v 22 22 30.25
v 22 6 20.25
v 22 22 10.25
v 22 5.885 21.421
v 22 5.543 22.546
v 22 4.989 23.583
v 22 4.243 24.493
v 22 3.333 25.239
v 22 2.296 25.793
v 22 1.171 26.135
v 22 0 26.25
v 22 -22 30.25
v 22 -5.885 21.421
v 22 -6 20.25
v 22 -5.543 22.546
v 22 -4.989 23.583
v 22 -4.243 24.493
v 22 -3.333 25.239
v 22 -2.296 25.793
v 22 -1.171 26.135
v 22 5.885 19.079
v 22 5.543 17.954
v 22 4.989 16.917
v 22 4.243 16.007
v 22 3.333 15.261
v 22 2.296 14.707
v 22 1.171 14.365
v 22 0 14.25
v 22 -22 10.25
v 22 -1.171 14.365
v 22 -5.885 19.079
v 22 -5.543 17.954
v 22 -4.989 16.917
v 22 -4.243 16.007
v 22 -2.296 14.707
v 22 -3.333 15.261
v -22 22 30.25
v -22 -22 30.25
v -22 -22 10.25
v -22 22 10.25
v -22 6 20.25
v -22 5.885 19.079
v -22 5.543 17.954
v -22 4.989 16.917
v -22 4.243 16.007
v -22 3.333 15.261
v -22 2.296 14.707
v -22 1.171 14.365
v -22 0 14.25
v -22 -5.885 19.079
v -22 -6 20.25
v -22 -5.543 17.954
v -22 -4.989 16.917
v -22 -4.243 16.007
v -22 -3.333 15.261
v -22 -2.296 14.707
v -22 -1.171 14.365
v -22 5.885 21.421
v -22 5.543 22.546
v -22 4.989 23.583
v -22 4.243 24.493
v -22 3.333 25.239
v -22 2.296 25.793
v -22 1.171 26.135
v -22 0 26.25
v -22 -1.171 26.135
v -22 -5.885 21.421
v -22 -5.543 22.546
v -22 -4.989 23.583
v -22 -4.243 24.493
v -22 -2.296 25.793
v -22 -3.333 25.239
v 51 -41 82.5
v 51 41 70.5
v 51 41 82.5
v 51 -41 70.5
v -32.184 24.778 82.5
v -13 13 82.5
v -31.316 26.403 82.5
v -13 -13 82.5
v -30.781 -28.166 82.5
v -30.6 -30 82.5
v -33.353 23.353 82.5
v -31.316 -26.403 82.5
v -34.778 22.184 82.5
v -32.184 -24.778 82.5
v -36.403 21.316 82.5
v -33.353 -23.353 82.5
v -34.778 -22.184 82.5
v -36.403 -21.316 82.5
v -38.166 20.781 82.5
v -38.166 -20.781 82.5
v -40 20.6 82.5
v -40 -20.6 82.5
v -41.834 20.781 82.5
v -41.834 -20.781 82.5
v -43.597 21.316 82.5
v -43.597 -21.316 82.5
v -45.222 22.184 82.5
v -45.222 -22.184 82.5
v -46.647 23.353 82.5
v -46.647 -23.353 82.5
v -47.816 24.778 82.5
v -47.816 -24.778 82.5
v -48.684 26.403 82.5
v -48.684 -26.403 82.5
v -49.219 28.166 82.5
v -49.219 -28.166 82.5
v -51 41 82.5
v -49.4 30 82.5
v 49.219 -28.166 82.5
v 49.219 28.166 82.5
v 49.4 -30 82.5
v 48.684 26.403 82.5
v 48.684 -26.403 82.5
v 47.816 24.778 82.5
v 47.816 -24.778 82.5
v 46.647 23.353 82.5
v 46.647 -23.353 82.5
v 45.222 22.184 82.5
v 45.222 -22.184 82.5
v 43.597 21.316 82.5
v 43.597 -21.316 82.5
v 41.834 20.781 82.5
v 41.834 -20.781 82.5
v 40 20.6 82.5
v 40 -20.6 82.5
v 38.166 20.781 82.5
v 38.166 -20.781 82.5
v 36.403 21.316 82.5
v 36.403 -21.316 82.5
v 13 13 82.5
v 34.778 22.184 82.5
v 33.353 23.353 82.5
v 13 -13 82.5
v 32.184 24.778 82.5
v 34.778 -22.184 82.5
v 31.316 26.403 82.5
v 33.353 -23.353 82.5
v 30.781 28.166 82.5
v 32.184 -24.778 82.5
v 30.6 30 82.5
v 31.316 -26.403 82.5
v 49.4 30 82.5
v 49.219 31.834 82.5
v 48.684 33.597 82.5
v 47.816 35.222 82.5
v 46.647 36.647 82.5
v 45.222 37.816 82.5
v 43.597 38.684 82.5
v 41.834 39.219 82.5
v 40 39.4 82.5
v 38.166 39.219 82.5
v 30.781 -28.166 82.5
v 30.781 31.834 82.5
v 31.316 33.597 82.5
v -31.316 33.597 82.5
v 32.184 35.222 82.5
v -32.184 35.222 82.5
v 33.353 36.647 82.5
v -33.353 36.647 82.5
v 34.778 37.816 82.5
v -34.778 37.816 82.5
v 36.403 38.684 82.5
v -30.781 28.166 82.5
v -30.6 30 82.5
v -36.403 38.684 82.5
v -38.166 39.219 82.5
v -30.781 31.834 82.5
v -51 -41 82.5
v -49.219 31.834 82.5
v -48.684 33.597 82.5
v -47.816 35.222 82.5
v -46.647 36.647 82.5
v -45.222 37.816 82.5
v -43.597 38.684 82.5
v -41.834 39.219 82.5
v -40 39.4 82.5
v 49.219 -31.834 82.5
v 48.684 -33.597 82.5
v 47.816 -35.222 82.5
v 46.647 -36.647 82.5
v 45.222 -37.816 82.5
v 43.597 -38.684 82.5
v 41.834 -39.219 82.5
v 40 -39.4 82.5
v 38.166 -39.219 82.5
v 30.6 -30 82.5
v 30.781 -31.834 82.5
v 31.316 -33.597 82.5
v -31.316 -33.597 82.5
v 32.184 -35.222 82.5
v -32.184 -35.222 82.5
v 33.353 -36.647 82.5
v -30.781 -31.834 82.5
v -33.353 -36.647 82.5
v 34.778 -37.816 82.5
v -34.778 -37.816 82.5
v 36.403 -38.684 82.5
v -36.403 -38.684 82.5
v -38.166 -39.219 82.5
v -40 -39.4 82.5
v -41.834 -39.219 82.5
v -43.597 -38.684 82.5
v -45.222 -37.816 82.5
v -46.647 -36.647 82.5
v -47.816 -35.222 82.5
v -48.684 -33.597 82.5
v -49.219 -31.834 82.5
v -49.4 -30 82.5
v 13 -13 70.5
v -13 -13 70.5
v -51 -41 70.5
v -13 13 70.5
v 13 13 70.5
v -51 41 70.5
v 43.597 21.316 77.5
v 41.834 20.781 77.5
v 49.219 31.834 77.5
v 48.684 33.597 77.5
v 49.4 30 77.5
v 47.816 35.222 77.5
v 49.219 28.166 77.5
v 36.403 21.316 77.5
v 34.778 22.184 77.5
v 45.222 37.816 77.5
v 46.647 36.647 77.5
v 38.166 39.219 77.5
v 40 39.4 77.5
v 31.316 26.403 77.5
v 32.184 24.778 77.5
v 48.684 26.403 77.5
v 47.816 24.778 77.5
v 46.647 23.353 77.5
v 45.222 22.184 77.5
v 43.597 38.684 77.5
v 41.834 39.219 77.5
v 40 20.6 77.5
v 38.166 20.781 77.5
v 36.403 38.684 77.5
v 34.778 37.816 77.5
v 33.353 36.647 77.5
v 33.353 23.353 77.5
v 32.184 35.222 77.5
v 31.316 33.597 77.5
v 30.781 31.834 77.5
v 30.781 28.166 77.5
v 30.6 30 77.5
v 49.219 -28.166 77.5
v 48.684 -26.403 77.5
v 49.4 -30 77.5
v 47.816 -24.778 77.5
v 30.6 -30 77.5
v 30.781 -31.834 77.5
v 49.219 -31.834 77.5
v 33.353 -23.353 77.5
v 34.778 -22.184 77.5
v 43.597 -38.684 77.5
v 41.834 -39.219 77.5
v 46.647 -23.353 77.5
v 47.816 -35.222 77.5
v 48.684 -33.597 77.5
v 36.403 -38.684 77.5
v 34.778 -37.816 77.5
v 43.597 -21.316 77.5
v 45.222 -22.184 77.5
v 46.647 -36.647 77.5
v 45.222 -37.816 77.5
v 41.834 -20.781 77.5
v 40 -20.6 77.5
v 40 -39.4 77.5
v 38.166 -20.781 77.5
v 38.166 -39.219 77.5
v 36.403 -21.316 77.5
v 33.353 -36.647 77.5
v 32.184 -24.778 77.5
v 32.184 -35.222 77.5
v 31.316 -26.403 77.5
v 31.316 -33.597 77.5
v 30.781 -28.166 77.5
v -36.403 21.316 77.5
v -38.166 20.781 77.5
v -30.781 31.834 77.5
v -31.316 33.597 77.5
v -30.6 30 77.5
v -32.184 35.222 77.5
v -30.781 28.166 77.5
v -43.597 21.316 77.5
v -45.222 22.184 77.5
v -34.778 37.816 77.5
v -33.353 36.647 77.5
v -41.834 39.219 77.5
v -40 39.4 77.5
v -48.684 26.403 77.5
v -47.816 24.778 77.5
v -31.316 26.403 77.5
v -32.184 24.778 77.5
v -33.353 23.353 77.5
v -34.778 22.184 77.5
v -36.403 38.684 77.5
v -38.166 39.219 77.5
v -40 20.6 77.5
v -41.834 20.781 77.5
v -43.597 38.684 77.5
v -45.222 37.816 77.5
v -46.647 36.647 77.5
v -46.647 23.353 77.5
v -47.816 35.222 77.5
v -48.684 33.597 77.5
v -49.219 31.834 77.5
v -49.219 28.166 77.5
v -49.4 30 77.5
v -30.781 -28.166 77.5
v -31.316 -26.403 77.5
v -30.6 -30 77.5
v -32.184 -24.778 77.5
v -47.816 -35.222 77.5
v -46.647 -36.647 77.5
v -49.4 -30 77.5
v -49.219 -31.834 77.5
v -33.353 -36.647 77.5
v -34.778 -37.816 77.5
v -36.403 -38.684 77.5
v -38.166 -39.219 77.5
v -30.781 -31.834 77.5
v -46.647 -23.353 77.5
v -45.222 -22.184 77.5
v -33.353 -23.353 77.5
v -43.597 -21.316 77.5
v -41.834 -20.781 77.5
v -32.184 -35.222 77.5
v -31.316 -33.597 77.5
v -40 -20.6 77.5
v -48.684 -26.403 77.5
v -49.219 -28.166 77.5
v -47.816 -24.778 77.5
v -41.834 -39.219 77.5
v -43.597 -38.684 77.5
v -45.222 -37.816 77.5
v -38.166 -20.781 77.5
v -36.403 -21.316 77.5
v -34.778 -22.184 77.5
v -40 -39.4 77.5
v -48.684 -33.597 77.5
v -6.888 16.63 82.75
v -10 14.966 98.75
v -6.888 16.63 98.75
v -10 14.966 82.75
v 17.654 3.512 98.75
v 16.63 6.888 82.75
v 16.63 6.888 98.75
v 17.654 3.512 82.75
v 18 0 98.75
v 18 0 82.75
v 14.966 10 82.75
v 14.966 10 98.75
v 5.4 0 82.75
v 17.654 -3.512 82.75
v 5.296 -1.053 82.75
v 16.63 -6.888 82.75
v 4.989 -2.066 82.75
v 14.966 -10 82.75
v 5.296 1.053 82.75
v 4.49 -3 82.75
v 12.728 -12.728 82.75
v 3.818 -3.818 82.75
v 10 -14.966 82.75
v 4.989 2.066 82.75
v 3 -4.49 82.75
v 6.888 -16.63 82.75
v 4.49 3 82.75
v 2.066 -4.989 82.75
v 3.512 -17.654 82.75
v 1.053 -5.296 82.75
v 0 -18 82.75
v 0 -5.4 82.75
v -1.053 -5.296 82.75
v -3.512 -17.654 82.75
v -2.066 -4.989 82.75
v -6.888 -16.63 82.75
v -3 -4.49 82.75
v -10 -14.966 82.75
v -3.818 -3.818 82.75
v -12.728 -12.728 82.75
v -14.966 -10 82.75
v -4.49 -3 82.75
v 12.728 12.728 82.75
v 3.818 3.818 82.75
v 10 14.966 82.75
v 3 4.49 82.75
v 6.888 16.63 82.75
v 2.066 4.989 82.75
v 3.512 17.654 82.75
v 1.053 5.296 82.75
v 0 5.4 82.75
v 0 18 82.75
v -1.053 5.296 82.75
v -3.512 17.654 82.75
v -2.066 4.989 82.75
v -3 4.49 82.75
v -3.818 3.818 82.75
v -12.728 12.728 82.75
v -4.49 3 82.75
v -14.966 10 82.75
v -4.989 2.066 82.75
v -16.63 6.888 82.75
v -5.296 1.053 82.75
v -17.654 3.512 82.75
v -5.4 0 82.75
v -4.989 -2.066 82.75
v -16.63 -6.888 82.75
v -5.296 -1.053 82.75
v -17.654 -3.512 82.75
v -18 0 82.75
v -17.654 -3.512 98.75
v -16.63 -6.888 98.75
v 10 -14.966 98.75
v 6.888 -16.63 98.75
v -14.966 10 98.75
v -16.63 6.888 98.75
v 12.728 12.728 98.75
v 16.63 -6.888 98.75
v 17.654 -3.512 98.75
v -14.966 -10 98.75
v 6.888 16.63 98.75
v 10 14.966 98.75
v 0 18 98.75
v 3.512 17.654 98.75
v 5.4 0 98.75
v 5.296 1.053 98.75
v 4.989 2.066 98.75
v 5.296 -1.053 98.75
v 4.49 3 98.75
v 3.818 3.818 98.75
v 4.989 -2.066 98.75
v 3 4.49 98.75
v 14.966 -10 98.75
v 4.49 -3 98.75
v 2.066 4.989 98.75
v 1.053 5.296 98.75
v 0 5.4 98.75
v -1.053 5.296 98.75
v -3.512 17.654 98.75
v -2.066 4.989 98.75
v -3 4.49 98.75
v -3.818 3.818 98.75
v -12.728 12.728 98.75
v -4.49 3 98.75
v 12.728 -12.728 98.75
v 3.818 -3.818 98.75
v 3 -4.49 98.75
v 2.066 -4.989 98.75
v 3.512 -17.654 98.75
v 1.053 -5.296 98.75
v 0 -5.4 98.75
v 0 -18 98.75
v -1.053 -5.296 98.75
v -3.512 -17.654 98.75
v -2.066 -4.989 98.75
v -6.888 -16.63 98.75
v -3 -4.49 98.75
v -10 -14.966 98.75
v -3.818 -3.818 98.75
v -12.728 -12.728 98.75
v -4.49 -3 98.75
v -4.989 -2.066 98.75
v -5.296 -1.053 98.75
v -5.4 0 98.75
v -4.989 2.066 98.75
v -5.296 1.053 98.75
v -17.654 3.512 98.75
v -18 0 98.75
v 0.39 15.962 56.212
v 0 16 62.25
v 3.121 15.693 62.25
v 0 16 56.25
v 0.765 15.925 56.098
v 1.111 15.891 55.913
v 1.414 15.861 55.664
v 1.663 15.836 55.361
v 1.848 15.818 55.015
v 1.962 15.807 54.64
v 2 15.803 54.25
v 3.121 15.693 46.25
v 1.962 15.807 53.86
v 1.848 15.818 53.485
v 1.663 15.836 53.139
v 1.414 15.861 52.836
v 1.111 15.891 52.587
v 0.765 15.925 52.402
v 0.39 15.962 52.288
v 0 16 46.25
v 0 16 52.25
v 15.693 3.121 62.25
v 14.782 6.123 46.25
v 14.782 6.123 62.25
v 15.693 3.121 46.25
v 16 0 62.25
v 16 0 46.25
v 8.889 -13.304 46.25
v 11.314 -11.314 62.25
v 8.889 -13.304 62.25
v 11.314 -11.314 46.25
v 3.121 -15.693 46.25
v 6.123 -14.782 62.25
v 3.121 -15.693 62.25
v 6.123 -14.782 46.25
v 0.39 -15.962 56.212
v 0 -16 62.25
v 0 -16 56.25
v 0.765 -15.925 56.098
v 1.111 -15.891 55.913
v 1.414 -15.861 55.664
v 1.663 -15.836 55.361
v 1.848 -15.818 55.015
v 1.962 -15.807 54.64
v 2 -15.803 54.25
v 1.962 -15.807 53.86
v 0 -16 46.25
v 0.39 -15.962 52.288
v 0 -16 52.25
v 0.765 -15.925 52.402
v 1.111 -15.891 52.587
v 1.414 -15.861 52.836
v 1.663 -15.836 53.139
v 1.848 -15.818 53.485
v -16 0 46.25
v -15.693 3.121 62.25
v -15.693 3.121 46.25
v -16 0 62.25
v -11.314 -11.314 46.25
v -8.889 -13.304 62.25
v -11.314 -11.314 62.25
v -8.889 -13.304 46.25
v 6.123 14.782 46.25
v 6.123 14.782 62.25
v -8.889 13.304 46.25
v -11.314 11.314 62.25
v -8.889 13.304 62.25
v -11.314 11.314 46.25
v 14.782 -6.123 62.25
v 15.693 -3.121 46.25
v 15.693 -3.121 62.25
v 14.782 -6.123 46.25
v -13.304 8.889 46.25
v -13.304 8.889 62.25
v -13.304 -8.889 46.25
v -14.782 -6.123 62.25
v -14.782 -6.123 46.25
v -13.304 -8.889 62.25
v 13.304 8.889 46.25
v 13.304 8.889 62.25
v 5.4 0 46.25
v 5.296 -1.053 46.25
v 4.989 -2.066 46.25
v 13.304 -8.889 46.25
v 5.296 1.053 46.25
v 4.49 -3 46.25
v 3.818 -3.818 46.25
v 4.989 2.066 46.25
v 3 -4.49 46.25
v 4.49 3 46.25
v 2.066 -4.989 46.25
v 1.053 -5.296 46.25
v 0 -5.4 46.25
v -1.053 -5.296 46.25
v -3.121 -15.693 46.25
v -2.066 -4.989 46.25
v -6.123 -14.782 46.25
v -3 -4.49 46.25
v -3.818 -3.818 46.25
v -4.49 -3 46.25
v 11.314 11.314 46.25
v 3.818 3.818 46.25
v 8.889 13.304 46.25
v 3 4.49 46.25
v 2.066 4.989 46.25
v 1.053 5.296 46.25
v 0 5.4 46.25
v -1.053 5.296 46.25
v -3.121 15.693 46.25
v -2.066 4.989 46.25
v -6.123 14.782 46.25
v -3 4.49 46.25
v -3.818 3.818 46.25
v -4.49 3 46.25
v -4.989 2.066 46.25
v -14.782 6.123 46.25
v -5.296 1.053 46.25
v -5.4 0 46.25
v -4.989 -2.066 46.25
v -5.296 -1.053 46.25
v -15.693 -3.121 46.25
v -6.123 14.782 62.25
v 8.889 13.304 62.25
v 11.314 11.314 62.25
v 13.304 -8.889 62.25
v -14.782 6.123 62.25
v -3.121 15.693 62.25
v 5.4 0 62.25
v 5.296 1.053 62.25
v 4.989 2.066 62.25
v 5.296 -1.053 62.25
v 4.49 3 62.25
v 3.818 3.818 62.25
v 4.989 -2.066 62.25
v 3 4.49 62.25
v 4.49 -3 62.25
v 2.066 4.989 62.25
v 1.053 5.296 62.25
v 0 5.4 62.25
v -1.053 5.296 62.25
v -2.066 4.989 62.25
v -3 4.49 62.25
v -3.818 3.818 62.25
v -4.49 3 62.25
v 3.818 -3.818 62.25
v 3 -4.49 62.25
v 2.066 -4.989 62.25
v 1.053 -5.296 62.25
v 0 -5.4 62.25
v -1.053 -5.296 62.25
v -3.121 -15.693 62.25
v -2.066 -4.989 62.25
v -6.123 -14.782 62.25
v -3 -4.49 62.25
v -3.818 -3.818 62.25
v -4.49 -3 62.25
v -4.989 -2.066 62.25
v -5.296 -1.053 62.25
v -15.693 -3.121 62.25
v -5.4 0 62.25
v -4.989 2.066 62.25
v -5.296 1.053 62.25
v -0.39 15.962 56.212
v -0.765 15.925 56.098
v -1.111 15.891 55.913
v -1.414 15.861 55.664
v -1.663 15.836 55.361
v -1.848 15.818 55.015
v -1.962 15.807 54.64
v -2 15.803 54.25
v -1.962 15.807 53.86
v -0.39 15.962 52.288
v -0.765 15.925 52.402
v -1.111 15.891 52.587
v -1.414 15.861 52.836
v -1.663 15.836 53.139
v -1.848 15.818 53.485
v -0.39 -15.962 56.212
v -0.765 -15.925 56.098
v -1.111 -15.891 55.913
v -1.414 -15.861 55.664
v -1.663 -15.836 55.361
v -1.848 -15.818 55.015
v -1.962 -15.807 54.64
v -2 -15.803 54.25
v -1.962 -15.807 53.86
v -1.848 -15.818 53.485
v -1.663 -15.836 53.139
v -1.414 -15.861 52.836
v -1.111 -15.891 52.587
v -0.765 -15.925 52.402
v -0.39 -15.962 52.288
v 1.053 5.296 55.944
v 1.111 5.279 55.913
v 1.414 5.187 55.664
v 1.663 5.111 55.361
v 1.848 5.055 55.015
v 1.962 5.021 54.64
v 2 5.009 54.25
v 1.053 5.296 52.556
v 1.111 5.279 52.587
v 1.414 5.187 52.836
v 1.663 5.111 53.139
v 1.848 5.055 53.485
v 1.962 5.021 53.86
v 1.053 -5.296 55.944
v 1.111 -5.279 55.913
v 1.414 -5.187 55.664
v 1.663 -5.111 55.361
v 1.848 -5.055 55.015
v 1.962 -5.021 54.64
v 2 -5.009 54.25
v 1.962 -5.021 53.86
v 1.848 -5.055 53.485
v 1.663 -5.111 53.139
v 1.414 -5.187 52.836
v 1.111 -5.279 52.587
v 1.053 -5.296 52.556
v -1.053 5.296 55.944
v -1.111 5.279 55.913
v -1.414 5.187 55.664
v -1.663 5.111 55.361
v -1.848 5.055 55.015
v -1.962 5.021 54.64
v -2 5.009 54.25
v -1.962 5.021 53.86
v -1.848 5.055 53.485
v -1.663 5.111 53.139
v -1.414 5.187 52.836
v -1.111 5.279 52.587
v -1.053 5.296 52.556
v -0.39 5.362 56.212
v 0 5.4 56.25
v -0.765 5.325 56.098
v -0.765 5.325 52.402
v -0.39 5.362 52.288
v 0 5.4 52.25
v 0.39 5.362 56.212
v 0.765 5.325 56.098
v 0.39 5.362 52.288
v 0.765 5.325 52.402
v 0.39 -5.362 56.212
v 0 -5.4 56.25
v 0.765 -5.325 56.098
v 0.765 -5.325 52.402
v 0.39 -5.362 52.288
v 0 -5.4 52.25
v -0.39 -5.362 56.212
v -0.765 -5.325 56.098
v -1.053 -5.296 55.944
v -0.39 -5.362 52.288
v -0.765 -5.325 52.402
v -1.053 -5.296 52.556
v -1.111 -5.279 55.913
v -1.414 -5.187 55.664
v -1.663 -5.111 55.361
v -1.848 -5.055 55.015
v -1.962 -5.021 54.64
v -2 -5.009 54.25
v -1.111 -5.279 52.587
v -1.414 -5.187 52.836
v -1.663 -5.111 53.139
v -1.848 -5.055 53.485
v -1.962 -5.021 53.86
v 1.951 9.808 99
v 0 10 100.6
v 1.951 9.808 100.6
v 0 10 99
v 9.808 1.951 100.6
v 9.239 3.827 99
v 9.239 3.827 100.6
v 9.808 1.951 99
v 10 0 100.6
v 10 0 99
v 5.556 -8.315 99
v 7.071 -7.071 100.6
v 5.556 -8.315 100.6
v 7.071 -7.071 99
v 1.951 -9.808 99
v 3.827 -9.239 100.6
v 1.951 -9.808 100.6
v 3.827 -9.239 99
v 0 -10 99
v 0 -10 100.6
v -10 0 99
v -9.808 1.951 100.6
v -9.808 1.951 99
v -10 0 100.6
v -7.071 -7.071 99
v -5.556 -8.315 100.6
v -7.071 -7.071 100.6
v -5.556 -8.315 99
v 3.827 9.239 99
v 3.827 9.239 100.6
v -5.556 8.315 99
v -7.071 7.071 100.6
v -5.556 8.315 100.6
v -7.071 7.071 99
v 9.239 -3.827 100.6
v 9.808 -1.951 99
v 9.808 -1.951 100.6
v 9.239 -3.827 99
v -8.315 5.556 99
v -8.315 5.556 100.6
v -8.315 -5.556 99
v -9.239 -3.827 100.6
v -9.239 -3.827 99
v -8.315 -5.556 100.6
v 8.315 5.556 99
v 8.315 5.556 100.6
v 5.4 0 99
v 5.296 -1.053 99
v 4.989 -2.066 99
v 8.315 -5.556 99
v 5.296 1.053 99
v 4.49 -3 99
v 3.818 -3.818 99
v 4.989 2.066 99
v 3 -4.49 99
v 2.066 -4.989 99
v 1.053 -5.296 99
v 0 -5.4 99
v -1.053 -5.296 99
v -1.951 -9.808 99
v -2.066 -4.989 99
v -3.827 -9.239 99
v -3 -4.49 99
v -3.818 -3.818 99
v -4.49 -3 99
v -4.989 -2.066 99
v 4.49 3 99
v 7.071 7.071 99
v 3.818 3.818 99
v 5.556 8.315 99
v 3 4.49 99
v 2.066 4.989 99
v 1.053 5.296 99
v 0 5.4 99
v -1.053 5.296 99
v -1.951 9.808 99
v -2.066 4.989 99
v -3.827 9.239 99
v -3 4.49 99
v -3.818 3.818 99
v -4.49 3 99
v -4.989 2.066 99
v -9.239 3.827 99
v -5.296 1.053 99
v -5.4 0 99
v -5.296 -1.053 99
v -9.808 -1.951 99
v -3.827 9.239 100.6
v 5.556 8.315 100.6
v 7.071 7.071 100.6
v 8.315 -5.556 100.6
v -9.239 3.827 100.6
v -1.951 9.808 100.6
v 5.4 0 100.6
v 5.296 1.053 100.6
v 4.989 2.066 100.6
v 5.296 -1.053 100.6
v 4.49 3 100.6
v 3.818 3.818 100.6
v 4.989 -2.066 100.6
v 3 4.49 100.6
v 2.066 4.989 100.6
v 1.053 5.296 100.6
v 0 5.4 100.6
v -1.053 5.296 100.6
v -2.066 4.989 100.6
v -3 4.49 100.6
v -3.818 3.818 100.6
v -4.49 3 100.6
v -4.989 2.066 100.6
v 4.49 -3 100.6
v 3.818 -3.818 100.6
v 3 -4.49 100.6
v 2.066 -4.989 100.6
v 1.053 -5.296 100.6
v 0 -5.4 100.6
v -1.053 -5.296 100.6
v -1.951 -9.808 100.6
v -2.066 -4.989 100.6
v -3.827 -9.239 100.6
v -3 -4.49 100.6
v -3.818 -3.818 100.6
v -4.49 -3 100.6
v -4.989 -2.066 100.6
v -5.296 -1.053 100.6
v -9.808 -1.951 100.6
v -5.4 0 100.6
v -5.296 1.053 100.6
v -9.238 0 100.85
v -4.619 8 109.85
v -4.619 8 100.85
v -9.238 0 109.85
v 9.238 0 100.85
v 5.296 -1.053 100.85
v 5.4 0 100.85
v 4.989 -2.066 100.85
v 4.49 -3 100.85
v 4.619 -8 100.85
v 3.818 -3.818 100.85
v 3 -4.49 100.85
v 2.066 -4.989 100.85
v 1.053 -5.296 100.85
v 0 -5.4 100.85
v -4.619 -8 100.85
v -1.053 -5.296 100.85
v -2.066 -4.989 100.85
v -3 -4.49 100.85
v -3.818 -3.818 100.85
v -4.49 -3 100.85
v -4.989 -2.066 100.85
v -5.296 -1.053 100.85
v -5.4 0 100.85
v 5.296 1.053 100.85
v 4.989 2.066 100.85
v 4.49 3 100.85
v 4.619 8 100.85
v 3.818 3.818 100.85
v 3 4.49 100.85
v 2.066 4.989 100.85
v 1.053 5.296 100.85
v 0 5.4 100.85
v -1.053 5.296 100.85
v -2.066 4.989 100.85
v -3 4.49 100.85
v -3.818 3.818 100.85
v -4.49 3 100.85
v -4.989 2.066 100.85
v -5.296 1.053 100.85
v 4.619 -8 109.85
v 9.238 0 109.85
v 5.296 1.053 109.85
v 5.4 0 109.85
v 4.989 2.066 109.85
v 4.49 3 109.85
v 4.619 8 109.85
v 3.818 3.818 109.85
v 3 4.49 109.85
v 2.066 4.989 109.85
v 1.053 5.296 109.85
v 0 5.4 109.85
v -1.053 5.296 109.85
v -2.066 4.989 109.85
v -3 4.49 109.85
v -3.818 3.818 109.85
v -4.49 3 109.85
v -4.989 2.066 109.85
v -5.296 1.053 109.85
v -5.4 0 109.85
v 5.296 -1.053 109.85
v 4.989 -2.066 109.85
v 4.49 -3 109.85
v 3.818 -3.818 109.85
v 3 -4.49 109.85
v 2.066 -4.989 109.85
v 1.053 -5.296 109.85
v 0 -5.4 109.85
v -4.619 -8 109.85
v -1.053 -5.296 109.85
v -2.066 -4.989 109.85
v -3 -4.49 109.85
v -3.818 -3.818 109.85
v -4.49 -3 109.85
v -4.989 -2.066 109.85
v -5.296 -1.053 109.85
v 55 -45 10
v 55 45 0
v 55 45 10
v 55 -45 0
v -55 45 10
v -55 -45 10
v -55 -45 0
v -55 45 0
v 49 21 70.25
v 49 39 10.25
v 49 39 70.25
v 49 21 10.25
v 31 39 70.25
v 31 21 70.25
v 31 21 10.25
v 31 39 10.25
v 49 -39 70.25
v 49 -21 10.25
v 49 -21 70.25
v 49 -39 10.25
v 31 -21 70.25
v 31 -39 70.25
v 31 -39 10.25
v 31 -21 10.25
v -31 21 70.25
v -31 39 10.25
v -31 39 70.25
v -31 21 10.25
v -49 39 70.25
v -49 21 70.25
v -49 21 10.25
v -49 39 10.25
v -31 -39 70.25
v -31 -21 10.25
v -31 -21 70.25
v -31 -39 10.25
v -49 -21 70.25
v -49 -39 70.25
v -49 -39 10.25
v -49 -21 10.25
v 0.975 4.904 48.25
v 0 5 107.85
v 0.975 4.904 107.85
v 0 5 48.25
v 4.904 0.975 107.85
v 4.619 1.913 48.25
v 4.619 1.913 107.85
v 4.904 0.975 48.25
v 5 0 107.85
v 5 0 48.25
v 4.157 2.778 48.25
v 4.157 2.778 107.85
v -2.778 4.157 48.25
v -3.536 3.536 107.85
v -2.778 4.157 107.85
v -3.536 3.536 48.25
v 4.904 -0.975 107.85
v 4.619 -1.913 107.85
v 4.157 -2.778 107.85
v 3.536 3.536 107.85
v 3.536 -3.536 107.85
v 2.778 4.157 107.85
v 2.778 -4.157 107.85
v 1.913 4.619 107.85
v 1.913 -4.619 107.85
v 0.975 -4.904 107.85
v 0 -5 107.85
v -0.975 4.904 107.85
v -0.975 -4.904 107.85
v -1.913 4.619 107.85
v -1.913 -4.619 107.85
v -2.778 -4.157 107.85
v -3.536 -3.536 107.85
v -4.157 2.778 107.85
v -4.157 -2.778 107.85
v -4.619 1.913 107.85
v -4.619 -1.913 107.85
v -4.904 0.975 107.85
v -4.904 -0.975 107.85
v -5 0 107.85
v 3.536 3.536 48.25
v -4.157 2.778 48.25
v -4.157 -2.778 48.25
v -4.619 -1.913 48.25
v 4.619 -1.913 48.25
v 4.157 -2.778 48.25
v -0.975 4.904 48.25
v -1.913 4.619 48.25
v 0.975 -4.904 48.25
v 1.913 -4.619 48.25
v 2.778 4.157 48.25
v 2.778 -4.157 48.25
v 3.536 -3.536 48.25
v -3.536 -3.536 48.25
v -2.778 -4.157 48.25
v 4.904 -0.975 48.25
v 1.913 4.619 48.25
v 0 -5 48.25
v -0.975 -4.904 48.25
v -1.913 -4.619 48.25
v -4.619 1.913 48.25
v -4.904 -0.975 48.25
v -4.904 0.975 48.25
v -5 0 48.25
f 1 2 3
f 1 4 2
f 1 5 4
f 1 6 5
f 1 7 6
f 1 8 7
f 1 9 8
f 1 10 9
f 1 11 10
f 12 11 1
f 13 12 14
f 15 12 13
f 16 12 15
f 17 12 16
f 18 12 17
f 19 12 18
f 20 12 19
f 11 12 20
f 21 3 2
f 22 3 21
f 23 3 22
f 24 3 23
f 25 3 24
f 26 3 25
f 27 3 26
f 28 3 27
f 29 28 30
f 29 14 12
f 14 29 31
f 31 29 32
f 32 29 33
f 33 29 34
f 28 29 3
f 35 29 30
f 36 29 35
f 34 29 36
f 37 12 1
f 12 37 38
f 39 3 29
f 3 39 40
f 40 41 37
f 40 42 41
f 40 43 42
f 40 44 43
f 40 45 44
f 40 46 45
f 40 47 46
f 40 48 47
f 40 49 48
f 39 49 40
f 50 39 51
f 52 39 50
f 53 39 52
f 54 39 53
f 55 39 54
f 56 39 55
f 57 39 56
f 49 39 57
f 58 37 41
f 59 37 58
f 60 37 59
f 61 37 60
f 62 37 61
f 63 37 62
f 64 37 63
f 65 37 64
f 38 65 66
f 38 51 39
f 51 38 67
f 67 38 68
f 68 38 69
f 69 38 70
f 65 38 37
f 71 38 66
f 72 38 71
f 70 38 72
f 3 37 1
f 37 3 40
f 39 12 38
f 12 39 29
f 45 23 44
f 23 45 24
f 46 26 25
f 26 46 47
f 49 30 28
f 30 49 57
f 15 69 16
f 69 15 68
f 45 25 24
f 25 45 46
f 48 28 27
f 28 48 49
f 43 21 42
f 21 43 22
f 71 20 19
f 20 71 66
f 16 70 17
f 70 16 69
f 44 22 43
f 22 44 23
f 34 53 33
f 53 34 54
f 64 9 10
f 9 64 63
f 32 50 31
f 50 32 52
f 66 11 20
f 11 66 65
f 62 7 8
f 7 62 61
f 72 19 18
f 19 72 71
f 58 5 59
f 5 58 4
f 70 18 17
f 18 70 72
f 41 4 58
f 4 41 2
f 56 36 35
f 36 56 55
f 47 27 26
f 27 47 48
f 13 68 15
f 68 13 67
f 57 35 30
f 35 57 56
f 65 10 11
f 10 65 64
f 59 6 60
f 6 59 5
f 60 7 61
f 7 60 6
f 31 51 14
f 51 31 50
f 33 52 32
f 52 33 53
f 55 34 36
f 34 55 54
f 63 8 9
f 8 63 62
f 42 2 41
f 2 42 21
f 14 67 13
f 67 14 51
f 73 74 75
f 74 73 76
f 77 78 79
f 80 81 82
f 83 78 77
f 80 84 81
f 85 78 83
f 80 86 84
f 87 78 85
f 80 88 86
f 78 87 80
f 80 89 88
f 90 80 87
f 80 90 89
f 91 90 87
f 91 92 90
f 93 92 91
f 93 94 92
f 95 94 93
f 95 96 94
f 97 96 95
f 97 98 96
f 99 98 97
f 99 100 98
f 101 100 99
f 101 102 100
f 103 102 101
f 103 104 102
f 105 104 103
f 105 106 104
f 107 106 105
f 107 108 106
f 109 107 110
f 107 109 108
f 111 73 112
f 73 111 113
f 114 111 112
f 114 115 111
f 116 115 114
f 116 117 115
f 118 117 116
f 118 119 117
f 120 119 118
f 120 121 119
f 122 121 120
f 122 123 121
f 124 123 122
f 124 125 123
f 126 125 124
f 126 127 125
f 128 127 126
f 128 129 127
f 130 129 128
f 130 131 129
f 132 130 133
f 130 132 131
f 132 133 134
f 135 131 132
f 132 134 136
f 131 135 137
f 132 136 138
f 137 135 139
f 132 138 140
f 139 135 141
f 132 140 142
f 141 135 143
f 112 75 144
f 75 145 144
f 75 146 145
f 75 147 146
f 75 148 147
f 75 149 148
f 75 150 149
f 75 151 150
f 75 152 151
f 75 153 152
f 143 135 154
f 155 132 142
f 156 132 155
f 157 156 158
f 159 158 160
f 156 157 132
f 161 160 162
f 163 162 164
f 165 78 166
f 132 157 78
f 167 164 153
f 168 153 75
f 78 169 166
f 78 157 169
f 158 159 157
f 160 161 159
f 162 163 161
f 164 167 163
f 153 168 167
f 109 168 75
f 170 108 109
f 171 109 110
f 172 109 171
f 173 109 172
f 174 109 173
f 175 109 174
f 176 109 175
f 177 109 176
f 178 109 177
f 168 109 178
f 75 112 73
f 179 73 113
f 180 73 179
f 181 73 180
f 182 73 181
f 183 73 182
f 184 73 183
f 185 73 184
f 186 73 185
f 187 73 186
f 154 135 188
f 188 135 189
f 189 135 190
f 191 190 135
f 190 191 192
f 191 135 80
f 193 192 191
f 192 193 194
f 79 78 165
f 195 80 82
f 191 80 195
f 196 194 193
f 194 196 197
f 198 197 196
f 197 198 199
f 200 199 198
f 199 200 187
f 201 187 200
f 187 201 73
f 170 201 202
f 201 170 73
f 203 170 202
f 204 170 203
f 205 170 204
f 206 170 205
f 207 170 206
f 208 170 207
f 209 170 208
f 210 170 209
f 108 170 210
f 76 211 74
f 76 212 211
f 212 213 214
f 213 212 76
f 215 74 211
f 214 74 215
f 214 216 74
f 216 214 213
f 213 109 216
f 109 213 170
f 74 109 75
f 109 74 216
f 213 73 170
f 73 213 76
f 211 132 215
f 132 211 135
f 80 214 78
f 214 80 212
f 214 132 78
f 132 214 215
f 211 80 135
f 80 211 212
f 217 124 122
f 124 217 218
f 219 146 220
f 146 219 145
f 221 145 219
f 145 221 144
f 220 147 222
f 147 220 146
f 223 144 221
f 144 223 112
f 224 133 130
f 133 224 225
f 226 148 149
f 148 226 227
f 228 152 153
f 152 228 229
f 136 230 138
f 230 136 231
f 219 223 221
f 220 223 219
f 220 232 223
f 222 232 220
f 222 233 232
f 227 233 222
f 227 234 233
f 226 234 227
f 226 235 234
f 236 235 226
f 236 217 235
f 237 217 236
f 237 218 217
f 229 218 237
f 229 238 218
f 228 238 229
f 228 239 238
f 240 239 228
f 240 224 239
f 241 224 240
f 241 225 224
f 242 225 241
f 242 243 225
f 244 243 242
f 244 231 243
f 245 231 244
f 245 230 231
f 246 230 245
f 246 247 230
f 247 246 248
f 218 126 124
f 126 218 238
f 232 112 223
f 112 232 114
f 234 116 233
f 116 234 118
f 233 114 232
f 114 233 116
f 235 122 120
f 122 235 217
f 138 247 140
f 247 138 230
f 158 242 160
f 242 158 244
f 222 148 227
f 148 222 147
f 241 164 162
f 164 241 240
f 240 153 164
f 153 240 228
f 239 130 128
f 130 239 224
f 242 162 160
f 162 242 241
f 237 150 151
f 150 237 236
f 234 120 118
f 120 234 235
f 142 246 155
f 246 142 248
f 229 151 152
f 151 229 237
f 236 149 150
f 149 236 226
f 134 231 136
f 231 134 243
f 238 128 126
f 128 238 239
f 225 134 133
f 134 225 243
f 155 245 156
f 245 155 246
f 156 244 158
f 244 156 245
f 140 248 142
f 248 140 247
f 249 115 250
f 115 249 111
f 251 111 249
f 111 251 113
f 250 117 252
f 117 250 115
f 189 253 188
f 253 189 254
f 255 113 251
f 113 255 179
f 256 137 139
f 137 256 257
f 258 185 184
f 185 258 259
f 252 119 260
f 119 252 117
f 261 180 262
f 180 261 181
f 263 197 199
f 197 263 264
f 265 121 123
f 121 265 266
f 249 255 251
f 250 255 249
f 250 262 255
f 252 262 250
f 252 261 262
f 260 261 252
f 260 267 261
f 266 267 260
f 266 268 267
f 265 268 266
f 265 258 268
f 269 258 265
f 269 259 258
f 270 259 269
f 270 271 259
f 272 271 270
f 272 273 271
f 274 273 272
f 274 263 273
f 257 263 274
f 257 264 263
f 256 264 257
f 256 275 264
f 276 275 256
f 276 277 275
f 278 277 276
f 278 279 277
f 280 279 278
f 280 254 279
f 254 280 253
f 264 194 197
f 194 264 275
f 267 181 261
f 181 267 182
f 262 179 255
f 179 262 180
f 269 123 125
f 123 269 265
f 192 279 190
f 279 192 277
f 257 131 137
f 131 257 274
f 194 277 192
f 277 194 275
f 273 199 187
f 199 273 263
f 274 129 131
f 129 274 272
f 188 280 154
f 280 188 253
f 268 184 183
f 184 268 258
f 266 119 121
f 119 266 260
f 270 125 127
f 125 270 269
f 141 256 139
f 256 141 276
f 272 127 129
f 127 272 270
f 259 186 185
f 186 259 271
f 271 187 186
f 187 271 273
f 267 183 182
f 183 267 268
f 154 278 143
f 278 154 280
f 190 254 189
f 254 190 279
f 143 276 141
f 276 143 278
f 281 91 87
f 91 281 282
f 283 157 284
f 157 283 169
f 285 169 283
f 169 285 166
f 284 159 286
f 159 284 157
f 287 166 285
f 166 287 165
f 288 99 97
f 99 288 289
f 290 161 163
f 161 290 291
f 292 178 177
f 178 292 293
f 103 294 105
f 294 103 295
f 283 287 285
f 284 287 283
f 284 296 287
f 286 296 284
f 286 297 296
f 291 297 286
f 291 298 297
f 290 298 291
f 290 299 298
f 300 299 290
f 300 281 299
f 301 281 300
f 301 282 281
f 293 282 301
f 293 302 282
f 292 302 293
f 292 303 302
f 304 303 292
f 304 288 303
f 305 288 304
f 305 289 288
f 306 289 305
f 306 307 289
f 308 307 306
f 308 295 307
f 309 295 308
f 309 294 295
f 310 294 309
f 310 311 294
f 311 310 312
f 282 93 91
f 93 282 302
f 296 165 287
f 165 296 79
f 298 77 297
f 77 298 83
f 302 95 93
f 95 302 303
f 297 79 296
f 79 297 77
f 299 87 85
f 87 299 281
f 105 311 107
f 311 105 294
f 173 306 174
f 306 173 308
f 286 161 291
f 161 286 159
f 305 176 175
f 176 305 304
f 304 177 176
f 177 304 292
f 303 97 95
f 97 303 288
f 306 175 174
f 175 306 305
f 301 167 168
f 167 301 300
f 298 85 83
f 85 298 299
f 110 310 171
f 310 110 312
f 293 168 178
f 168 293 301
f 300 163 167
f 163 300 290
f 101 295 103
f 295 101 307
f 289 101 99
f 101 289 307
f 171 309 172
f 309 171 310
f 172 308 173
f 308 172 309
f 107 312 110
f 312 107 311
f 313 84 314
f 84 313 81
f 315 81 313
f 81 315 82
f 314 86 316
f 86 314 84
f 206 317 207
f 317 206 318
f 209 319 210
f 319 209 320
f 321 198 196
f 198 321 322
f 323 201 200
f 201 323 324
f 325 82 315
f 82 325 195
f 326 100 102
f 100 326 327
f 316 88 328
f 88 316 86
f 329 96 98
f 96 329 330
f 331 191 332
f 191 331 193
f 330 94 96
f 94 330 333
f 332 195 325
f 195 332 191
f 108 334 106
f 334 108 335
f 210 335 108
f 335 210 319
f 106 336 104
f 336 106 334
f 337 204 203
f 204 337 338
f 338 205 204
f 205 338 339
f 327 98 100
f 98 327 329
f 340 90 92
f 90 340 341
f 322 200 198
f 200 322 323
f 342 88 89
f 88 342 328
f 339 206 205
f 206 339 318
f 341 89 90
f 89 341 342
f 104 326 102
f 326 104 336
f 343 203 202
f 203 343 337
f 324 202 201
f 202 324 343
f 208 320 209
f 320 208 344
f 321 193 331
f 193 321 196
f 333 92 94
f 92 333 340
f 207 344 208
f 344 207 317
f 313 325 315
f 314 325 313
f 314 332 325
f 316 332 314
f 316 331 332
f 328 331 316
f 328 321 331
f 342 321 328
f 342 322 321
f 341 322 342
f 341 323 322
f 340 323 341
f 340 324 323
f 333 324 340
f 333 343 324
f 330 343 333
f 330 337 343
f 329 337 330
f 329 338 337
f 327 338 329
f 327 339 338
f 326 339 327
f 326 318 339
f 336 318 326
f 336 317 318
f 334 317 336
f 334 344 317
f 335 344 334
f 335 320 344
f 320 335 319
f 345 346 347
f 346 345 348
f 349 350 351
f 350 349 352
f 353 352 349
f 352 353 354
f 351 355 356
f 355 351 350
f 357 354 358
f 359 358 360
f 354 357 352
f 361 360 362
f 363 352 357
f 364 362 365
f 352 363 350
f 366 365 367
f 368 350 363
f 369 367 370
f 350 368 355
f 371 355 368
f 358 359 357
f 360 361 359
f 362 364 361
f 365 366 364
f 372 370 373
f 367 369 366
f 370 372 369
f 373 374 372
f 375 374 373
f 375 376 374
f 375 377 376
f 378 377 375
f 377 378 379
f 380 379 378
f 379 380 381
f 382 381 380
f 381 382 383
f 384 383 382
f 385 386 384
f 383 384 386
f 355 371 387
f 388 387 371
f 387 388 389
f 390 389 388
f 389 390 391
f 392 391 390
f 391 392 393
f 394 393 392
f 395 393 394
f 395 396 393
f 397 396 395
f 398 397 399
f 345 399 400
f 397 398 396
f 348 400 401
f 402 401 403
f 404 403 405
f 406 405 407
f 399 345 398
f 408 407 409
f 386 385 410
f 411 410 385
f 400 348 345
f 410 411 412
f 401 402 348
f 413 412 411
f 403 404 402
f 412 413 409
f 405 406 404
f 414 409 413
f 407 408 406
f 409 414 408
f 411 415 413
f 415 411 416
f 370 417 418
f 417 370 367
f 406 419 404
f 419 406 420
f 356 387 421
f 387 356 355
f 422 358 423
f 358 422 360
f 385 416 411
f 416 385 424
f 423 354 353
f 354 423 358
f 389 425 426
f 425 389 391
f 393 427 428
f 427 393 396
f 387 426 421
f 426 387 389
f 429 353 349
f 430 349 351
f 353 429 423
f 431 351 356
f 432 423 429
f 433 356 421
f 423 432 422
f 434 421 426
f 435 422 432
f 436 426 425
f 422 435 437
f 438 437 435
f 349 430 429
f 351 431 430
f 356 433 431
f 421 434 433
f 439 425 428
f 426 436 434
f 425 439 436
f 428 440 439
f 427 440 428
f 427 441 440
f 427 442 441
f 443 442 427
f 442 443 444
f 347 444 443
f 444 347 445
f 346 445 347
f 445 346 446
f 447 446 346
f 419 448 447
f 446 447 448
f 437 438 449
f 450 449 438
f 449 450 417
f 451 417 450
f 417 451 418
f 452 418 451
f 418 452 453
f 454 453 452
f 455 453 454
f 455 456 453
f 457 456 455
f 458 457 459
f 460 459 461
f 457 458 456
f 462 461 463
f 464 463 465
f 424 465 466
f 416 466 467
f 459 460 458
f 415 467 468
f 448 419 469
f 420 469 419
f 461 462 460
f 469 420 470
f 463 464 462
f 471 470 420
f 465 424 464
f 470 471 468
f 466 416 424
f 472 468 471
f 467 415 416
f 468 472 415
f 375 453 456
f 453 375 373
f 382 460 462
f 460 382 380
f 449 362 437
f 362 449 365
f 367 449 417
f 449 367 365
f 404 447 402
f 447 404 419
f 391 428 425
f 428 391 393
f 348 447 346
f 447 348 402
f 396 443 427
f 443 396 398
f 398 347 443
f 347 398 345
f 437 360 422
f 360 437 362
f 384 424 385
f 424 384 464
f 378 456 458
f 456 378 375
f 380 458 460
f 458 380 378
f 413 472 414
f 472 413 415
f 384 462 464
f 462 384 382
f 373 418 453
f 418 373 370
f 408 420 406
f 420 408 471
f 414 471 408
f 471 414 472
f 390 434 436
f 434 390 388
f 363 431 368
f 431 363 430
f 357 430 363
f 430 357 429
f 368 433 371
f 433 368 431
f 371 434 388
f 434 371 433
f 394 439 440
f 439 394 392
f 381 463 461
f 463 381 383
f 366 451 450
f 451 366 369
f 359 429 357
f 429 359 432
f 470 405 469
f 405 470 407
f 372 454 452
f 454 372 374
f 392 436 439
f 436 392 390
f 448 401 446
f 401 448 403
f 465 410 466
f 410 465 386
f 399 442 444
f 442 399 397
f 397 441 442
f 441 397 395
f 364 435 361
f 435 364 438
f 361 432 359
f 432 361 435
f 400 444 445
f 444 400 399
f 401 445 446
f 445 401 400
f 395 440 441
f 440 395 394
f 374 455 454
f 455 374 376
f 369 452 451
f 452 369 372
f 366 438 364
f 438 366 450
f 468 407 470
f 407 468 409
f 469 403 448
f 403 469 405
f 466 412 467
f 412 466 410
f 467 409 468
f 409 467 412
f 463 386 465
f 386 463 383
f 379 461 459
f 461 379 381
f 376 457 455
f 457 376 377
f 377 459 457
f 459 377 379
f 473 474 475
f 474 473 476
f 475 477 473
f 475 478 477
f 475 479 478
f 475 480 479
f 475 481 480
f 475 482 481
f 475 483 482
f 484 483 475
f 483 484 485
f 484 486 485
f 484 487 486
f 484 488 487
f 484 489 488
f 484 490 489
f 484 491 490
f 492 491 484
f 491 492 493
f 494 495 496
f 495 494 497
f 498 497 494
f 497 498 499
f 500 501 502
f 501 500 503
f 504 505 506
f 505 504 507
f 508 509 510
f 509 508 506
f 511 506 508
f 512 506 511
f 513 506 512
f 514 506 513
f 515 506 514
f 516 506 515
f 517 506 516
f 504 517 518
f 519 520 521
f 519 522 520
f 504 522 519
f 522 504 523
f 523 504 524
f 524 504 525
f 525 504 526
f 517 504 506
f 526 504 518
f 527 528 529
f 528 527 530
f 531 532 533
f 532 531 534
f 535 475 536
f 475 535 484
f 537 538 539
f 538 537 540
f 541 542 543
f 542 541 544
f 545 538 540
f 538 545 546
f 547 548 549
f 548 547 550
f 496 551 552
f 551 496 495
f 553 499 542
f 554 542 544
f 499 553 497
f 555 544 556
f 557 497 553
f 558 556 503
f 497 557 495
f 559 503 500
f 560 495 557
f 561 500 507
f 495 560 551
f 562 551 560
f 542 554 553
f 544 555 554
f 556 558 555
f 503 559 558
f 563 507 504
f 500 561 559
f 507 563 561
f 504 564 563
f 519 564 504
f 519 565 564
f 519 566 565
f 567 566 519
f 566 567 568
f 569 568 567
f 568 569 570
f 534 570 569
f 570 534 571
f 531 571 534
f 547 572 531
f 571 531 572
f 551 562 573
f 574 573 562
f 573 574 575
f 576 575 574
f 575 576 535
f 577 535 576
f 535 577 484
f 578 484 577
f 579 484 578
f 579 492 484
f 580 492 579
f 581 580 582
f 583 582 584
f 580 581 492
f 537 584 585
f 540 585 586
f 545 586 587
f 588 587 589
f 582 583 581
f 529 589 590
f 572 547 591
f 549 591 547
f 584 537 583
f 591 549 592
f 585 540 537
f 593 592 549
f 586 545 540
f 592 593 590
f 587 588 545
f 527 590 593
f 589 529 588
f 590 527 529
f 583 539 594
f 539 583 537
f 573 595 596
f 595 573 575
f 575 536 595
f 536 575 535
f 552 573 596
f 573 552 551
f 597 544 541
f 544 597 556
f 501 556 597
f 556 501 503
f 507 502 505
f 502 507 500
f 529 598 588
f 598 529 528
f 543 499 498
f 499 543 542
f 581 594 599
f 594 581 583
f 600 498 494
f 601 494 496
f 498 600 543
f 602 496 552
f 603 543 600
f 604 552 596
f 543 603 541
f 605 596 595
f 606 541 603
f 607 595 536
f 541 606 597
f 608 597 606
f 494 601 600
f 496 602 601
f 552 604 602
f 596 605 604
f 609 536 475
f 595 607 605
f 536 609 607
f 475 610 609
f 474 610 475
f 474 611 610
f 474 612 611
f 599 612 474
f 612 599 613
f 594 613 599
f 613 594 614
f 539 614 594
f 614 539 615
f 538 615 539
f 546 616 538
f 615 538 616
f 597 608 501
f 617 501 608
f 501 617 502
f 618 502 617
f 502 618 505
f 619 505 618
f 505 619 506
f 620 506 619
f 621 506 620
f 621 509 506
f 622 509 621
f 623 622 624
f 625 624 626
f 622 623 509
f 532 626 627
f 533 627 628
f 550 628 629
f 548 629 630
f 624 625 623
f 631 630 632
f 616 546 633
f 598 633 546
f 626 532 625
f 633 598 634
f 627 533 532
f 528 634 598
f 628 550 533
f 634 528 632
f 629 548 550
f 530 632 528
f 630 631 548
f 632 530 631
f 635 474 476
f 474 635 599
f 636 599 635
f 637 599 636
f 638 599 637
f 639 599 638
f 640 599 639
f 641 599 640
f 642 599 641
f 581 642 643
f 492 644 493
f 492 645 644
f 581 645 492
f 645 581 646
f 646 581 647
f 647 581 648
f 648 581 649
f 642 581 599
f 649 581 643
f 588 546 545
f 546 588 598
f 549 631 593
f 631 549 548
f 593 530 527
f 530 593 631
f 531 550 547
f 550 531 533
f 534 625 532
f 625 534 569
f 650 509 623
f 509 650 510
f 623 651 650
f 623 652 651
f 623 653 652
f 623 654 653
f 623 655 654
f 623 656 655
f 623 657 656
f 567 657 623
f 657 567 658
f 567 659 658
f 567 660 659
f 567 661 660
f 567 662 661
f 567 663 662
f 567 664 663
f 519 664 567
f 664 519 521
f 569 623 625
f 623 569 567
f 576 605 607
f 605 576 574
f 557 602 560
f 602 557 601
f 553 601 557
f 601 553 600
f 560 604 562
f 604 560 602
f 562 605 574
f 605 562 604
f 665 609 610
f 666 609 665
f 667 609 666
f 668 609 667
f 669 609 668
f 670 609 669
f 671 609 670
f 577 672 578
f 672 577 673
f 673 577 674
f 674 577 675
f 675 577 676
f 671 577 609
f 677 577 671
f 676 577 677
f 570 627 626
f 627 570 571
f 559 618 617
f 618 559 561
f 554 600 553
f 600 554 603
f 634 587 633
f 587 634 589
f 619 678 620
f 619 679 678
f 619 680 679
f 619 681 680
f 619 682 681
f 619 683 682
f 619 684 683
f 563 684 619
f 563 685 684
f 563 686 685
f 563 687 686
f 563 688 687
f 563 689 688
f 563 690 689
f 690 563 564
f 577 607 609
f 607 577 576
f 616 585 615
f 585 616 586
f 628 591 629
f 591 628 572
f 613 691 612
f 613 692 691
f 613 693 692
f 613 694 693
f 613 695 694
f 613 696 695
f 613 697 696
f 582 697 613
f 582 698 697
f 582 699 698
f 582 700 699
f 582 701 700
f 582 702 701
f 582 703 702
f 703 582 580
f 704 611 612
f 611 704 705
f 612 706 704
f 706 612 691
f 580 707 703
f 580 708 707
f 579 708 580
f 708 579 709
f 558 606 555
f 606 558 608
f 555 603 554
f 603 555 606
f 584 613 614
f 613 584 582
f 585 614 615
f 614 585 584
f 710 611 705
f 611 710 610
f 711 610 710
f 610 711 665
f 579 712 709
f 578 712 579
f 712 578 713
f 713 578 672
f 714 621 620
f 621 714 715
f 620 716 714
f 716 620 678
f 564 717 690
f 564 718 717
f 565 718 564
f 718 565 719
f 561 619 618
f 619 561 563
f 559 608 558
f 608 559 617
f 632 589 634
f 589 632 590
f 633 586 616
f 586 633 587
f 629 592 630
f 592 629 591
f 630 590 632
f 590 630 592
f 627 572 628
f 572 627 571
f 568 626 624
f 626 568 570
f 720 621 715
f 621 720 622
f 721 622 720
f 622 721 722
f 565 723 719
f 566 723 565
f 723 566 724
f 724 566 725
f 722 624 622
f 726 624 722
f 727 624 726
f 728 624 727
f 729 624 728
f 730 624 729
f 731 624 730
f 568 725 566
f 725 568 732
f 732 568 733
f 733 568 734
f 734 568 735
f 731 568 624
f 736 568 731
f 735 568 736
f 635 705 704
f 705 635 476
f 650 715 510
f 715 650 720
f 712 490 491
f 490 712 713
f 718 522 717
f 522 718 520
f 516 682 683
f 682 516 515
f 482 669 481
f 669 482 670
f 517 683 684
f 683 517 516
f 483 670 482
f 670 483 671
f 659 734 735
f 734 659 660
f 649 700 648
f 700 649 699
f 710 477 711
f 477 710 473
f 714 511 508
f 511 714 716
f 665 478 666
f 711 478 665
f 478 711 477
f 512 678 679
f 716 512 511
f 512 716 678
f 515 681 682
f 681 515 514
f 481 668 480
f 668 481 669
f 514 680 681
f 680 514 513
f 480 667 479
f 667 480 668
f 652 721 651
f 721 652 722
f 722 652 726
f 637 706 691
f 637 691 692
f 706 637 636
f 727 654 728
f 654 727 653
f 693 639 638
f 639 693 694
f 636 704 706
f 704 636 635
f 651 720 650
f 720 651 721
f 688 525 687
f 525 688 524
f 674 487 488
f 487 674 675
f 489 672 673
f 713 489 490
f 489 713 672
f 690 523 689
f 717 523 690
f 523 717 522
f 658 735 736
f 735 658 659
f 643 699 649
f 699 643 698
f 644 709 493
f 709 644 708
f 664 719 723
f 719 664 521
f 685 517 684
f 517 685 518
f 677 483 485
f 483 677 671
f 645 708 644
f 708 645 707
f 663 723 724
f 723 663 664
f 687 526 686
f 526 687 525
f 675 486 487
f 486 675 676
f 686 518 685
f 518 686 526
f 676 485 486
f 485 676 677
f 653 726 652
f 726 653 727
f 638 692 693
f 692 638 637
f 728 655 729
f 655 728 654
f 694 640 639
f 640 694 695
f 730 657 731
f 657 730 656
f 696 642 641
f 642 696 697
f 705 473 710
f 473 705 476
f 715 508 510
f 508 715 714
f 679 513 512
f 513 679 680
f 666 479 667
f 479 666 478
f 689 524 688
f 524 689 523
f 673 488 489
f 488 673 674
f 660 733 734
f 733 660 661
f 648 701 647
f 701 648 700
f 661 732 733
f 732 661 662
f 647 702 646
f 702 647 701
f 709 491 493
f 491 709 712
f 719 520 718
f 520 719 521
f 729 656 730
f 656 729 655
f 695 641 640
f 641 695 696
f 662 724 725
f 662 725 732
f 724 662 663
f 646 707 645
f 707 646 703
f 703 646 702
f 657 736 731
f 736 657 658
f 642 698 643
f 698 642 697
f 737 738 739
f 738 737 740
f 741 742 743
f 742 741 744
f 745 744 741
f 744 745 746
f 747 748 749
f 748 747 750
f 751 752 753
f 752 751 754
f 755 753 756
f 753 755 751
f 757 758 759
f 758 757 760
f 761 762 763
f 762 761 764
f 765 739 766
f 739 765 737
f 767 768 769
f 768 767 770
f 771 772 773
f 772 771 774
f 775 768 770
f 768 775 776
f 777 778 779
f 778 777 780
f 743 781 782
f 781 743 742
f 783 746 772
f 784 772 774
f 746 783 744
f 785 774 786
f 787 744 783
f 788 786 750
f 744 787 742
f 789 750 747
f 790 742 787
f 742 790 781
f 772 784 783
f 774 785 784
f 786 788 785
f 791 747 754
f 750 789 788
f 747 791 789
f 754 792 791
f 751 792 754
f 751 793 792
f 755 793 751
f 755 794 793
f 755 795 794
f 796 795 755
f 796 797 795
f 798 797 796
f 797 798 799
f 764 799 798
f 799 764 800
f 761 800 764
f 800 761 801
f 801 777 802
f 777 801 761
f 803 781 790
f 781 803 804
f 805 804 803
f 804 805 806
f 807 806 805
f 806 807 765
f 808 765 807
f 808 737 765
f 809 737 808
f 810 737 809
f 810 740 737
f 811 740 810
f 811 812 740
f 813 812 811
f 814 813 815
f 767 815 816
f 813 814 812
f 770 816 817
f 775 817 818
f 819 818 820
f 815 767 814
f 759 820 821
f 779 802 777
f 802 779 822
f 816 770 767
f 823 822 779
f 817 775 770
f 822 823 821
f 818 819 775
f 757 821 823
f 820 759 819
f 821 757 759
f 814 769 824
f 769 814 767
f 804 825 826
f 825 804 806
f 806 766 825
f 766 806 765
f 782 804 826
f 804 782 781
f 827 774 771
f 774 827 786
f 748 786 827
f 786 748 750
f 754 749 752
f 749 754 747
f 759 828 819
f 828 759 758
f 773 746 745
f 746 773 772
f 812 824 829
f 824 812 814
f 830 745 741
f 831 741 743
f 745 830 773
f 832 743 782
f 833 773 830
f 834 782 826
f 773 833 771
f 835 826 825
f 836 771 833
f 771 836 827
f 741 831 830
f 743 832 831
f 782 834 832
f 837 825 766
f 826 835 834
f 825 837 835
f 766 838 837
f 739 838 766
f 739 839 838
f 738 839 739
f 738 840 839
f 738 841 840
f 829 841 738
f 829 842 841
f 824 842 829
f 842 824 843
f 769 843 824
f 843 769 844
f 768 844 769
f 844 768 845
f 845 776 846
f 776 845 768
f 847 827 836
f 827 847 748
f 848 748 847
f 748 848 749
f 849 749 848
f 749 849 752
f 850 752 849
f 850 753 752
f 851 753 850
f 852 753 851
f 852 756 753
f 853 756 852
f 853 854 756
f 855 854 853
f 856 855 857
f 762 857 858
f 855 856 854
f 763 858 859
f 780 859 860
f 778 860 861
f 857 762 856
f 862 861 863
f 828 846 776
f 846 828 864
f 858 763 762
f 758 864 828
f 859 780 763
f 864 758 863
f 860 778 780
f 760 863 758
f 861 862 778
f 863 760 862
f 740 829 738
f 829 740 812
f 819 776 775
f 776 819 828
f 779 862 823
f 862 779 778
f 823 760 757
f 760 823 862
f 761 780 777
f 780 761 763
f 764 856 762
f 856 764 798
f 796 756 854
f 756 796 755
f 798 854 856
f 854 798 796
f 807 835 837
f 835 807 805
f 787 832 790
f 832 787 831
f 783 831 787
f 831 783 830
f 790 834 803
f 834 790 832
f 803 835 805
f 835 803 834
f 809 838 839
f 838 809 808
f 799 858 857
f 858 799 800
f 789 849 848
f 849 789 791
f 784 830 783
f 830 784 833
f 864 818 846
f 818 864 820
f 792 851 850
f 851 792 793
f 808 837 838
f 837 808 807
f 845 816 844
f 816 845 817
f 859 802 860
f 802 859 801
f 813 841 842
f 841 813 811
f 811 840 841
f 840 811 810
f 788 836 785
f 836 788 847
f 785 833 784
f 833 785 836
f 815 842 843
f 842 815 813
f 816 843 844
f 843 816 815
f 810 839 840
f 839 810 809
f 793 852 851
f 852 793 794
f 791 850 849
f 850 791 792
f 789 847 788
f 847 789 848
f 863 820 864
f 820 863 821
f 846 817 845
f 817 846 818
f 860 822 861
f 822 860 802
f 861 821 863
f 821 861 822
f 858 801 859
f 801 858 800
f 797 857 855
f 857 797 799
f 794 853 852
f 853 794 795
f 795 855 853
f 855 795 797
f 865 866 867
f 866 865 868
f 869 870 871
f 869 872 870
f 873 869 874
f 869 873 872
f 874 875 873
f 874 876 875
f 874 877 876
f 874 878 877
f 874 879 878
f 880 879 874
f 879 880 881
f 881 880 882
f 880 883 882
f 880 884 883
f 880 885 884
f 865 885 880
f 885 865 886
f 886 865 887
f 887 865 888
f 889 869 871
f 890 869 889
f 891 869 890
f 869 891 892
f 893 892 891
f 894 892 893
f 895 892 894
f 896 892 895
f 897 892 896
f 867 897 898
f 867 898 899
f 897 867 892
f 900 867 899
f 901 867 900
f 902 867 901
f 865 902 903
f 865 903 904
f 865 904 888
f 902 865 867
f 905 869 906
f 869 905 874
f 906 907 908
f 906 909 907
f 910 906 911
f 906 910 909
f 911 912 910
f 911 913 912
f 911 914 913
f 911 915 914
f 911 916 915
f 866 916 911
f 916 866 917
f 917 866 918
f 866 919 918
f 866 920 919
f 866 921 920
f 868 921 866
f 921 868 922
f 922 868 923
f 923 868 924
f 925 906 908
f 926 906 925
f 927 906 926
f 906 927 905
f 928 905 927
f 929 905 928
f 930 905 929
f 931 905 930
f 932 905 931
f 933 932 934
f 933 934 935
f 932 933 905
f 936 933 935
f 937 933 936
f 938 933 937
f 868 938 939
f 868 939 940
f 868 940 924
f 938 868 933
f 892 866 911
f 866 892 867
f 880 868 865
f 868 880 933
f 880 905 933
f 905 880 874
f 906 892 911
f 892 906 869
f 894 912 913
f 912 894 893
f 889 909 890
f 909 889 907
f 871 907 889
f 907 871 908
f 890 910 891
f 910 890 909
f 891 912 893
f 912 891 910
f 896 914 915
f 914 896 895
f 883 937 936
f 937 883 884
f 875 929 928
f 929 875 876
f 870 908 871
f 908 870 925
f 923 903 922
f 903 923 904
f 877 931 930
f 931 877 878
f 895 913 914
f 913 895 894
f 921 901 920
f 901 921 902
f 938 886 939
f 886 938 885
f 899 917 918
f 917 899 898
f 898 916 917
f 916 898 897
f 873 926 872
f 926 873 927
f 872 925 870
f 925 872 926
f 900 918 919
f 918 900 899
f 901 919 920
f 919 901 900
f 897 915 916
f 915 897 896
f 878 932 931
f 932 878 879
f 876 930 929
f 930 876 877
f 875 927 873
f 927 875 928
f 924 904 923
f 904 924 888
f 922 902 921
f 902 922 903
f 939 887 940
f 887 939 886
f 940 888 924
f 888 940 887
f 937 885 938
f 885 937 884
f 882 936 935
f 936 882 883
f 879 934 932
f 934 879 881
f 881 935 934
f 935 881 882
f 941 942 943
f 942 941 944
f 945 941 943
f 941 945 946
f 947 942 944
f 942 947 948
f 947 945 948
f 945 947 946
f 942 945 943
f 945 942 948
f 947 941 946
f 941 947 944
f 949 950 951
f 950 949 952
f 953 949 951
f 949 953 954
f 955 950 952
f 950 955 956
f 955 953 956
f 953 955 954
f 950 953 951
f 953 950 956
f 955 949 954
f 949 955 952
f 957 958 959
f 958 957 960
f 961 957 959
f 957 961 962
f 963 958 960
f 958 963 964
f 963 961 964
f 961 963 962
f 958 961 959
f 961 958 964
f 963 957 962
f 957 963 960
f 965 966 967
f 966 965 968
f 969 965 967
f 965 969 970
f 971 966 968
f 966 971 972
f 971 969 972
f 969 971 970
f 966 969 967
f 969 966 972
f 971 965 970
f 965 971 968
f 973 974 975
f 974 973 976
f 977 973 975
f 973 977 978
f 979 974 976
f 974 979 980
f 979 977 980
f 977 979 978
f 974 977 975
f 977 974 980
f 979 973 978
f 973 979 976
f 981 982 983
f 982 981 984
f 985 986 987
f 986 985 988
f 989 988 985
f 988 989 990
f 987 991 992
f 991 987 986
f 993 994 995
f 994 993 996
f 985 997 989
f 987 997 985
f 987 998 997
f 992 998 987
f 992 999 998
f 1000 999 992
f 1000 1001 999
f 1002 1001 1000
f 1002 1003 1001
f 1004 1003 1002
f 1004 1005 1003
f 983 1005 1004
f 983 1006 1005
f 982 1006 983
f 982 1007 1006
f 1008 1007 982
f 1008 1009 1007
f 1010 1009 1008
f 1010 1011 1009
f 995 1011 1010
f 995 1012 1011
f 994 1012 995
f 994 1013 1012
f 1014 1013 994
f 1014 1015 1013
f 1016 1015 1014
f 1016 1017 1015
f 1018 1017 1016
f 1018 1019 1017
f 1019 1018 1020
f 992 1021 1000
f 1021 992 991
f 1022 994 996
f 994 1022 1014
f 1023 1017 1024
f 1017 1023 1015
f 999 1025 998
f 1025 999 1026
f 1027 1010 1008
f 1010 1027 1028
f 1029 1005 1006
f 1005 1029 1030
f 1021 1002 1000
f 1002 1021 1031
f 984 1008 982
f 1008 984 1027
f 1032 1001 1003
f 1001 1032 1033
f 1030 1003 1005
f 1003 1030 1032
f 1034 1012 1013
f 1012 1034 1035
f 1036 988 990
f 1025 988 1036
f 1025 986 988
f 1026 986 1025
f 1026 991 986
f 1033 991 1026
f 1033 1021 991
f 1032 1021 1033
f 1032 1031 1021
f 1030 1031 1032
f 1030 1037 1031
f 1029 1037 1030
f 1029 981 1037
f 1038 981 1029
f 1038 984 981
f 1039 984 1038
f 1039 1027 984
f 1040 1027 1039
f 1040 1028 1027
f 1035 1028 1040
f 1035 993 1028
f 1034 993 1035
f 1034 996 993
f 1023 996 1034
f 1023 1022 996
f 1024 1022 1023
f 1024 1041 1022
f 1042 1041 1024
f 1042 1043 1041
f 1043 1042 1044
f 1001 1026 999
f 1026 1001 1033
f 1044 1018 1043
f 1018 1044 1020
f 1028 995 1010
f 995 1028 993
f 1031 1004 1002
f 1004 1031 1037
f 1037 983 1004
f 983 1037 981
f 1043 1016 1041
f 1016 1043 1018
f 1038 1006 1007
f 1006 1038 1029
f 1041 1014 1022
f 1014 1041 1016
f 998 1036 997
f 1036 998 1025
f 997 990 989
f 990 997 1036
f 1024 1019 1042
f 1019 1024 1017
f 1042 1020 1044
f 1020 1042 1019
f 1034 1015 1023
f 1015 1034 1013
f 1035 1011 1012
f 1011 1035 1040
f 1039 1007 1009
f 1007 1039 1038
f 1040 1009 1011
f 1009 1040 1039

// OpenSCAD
$fn = 32;

// ------------------------------------------------------------------------
// Arbor press fixture: screw d10, posts 60 mm, gap 16 mm
// Every part is its own module, assembly() places every instance.
// ------------------------------------------------------------------------

// --- part 1 ---
module press_bed() {
  difference() {
    translate([-55, -45, 0]) cube([110, 90, 10]);
  }
}

// --- part 2 ---
module anvil_block() {
  difference() {
    translate([-22, -22, 0]) cube([44, 44, 20]);
    translate([0, 0, 10]) rotate([0, 90, 0]) cylinder(h = 46, d = 12, center = true);
  }
}

// --- part 3 ---
module press_post_a() {
  translate([-9, -9, 0]) cube([18, 18, 60]);
}

// --- part 4 ---
module press_post_b() {
  translate([-9, -9, 0]) cube([18, 18, 60]);
}

// --- part 5 ---
module press_post_c() {
  translate([-9, -9, 0]) cube([18, 18, 60]);
}

// --- part 6 ---
module press_post_d() {
  translate([-9, -9, 0]) cube([18, 18, 60]);
}

// --- part 7 ---
module press_frame() {
  difference() {
    translate([-51, -41, 0]) cube([102, 82, 12]);
    translate([-13, -13, -1]) cube([26, 26, 14]);
    translate([40, 30, 7]) cylinder(h = 6, d = 18.8);
    translate([40, -30, 7]) cylinder(h = 6, d = 18.8);
    translate([-40, 30, 7]) cylinder(h = 6, d = 18.8);
    translate([-40, -30, 7]) cylinder(h = 6, d = 18.8);
  }
}

// --- part 8 ---
module guide_ring() {
  difference() {
      translate([0, 0, 0]) cylinder(h = 16, d = 36);
      translate([0, 0, -1]) cylinder(h = 18, d = 10.8);
    }
}

// --- part 9 ---
module press_screw() {
  translate([0, 0, -29.8]) cylinder(h = 59.6, d = 10);
}

// --- part 10 ---
module press_head() {
  difference() {
    cylinder(h = 16, d = 32);
    translate([0, 0, -1]) cylinder(h = 18, d = 10.8);
    translate([0, 0, 8]) rotate([90, 0, 0]) cylinder(h = 34, d = 4, center = true);
  }
}

// --- part 11 ---
module nut_washer() {
  difference() {
      translate([0, 0, 0]) cylinder(h = 1.6, d = 20);
      translate([0, 0, -1]) cylinder(h = 3.6, d = 10.8);
    }
}

// --- part 12 ---
module press_nut() {
  difference() {
    linear_extrude(height = 9) polygon(points = [[9.238, 0], [4.619, 8], [-4.619, 8], [-9.238, 0], [-4.619, -8], [4.619, -8]]);
    translate([0, 0, -1]) cylinder(h = 11, d = 10.8);
  }
}

// --- assembly ---
module assembly() {
  color([0.80, 0.24, 0.20]) translate([0, 0, 0]) rotate([0, 0, 0]) press_bed();
  color([0.20, 0.45, 0.75]) translate([0, 0, 10.25]) rotate([0, 0, 0]) anvil_block();
  color([0.25, 0.62, 0.32]) translate([40, 30, 10.25]) rotate([0, 0, 0]) press_post_a();
  color([0.92, 0.70, 0.18]) translate([40, -30, 10.25]) rotate([0, 0, 0]) press_post_b();
  color([0.58, 0.35, 0.70]) translate([-40, 30, 10.25]) rotate([0, 0, 0]) press_post_c();
  color([0.16, 0.66, 0.66]) translate([-40, -30, 10.25]) rotate([0, 0, 0]) press_post_d();
  color([0.85, 0.48, 0.18]) translate([0, 0, 70.5]) rotate([0, 0, 0]) press_frame();
  color([0.55, 0.60, 0.65]) translate([0, 0, 82.75]) rotate([0, 0, 0]) guide_ring();
  color([0.75, 0.30, 0.55]) translate([0, 0, 78.05]) rotate([0, 0, 0]) press_screw();
  color([0.42, 0.52, 0.28]) translate([0, 0, 46.25]) rotate([0, 0, 0]) press_head();
  color([0.80, 0.24, 0.20]) translate([0, 0, 99]) rotate([0, 0, 0]) nut_washer();
  color([0.20, 0.45, 0.75]) translate([0, 0, 100.85]) rotate([0, 0, 0]) press_nut();
}

assembly();
